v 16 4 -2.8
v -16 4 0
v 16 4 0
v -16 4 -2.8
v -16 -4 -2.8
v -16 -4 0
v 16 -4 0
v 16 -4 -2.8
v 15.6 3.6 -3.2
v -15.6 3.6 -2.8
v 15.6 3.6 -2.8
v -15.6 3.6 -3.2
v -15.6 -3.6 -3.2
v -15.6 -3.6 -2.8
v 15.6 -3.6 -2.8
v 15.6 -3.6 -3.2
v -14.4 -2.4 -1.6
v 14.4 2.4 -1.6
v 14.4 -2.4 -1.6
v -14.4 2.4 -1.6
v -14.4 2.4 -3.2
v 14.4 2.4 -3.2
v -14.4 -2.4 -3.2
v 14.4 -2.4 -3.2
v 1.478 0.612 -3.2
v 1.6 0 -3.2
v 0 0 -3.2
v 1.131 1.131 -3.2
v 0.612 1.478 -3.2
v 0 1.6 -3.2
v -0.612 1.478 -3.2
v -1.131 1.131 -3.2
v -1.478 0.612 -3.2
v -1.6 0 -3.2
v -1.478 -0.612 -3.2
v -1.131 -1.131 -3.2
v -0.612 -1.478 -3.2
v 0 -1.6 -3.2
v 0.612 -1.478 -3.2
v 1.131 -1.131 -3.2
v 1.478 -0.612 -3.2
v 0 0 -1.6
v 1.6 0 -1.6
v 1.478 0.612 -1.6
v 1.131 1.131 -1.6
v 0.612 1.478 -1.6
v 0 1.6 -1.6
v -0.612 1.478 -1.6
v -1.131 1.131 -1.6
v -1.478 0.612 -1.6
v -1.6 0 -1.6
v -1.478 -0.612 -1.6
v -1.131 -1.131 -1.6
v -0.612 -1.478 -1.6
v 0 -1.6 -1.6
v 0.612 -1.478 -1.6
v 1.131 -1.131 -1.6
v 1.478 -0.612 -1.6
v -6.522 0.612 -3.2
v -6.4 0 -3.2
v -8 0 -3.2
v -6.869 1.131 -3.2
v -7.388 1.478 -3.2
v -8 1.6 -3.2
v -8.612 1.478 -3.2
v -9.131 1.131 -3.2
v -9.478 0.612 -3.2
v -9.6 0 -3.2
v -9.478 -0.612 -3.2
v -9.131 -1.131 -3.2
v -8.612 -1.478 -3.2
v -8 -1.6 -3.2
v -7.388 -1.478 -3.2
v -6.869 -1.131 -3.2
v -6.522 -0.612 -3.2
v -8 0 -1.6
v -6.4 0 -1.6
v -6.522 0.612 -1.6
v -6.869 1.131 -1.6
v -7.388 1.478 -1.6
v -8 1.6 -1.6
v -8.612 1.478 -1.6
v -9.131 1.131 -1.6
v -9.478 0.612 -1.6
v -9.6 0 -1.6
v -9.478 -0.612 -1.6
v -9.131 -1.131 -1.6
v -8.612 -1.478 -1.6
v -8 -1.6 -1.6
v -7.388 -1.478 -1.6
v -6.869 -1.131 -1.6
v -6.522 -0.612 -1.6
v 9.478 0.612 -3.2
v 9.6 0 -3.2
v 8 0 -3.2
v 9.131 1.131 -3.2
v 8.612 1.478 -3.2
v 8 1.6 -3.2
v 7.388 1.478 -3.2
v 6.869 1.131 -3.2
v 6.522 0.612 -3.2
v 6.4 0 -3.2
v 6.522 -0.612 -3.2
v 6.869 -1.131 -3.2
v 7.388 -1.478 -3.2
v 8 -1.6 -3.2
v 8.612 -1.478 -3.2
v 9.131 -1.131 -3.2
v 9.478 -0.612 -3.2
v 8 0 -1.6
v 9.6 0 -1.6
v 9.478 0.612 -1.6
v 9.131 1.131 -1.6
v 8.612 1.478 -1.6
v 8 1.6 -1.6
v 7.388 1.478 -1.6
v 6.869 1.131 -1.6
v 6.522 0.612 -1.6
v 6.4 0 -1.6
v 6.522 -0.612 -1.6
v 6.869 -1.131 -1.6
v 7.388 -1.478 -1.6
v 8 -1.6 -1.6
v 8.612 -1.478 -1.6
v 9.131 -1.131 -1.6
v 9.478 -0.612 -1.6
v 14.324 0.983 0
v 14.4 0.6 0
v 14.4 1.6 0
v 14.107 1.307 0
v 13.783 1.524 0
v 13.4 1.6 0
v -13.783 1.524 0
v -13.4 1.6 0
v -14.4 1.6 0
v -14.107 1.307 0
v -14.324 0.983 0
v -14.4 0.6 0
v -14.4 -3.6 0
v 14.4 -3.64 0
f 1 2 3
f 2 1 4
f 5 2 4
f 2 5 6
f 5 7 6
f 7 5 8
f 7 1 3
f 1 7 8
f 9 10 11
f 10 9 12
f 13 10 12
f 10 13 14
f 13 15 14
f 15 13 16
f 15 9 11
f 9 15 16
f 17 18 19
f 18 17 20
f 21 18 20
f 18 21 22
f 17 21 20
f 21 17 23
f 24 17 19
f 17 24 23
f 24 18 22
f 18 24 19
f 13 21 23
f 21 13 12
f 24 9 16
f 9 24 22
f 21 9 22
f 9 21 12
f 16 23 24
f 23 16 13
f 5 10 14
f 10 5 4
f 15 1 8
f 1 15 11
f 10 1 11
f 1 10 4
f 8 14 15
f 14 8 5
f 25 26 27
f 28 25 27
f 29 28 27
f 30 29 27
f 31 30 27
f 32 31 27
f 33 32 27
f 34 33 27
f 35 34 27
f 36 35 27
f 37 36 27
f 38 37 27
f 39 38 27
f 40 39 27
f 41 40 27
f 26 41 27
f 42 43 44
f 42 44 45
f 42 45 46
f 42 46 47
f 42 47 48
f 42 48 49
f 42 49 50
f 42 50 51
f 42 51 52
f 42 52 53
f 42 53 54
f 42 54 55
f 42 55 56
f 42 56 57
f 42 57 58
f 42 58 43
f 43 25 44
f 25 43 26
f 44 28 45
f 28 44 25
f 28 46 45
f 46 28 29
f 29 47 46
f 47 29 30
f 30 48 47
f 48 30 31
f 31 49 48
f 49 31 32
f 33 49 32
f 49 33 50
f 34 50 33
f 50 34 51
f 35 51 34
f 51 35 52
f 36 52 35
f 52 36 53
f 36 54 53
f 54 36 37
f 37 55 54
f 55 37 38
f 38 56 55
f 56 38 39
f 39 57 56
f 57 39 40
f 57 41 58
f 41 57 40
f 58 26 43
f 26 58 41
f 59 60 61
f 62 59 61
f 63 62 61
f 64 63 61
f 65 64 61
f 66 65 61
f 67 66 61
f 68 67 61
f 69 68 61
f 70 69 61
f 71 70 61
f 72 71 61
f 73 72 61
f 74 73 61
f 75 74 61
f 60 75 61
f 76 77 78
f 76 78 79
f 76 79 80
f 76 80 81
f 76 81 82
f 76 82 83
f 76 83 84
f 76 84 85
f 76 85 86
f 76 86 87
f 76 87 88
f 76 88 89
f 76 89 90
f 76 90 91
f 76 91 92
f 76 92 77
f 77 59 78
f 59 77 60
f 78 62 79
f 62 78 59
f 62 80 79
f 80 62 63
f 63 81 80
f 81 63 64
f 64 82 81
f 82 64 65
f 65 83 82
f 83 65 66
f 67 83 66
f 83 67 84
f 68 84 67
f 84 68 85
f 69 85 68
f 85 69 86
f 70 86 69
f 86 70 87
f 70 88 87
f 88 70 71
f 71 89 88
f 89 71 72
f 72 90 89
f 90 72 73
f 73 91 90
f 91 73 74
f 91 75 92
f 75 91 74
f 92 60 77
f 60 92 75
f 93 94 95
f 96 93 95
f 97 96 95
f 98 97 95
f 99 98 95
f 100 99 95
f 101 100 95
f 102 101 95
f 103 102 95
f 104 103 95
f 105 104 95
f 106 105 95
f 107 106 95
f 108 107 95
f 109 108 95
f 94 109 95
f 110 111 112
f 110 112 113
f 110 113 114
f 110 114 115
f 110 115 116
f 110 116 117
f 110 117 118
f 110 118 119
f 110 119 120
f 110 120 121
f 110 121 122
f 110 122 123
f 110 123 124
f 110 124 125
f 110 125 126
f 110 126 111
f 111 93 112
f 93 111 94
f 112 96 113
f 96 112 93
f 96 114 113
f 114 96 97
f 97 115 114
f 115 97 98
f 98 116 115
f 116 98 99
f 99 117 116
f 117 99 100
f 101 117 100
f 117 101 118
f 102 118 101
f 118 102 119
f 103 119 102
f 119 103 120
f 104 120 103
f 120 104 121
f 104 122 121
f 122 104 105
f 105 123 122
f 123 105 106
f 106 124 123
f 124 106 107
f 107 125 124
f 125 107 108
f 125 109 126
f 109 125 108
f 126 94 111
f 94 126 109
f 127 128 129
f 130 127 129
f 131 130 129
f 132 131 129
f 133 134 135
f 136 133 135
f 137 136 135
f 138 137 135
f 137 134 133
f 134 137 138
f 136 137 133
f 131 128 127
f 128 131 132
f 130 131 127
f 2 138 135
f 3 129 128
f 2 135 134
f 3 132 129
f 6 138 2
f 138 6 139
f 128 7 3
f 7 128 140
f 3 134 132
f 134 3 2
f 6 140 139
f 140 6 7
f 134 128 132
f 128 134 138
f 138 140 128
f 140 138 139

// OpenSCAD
// file: ../p/4-4edge.scad
use <../lib.scad>
function ldraw_lib__4_4edge() = [
// 0 Circle 1.0
// 0 Name: 4-4edge.dat
// 0 Author: James Jessiman
// 0 !LDRAW_ORG Primitive UPDATE 2017-01
// 0 !LICENSE Licensed under CC BY 2.0 and CC BY 4.0 : see CAreadme.txt
// 
// 0 BFC CERTIFY CCW
  [0,"BFC","CERTIFY"],
  [0,"BFC","CCW"],
// 
// 0 !HISTORY 1998-12-15 [PTadmin] Official Update 1998-10
// 0 !HISTORY 2005-12-28 [PTadmin] Official Update 2005-01
// 0 !HISTORY 2007-06-24 [PTadmin] Header formatted for Contributor Agreement
// 0 !HISTORY 2008-07-01 [PTadmin] Official Update 2008-01
// 0 !HISTORY 2017-01-15 [Steffen] BFCed
// 0 !HISTORY 2017-12-30 [PTadmin] Official Update 2017-01
// 
// 
// 2 24 1 0 0 0.9239 0 0.3827
  [2,24,1,0,0,0.9239,0,0.3827],
// 2 24 0.9239 0 0.3827 0.7071 0 0.7071
  [2,24,0.9239,0,0.3827,0.7071,0,0.7071],
// 2 24 0.7071 0 0.7071 0.3827 0 0.9239
  [2,24,0.7071,0,0.7071,0.3827,0,0.9239],
// 2 24 0.3827 0 0.9239 0 0 1
  [2,24,0.3827,0,0.9239,0,0,1],
// 2 24 0 0 1 -0.3827 0 0.9239
  [2,24,0,0,1,-0.3827,0,0.9239],
// 2 24 -0.3827 0 0.9239 -0.7071 0 0.7071
  [2,24,-0.3827,0,0.9239,-0.7071,0,0.7071],
// 2 24 -0.7071 0 0.7071 -0.9239 0 0.3827
  [2,24,-0.7071,0,0.7071,-0.9239,0,0.3827],
// 2 24 -0.9239 0 0.3827 -1 0 -0
  [2,24,-0.9239,0,0.3827,-1,0,-0],
// 2 24 -1 0 -0 -0.9239 0 -0.3827
  [2,24,-1,0,-0,-0.9239,0,-0.3827],
// 2 24 -0.9239 0 -0.3827 -0.7071 0 -0.7071
  [2,24,-0.9239,0,-0.3827,-0.7071,0,-0.7071],
// 2 24 -0.7071 0 -0.7071 -0.3827 0 -0.9239
  [2,24,-0.7071,0,-0.7071,-0.3827,0,-0.9239],
// 2 24 -0.3827 0 -0.9239 0 0 -1
  [2,24,-0.3827,0,-0.9239,0,0,-1],
// 2 24 0 0 -1 0.3827 0 -0.9239
  [2,24,0,0,-1,0.3827,0,-0.9239],
// 2 24 0.3827 0 -0.9239 0.7071 0 -0.7071
  [2,24,0.3827,0,-0.9239,0.7071,0,-0.7071],
// 2 24 0.7071 0 -0.7071 0.9239 0 -0.3827
  [2,24,0.7071,0,-0.7071,0.9239,0,-0.3827],
// 2 24 0.9239 0 -0.3827 1 0 0
  [2,24,0.9239,0,-0.3827,1,0,0],
];
module ldraw_lib__4_4edge(step=0, col=false, unit=2/5, alt=false, line=0.2, solid=!$preview)
    makepoly(ldraw_lib__4_4edge(), step=step, col=col, unit=unit, alt=alt, line=line, solid=solid);
ldraw_lib__4_4edge(line=0.2);
// file: ../p/4-4disc.scad
use <../lib.scad>
function ldraw_lib__4_4disc() = [
// 0 Disc 1.0
// 0 Name: 4-4disc.dat
// 0 Author: James Jessiman
// 0 !LDRAW_ORG Primitive UPDATE 2002-02
// 0 !LICENSE Licensed under CC BY 2.0 and CC BY 4.0 : see CAreadme.txt
// 
// 0 BFC CERTIFY CCW
  [0,"BFC","CERTIFY"],
  [0,"BFC","CCW"],
// 
// 0 !HISTORY 1998-12-15 [PTadmin] Official Update 1998-10
// 0 !HISTORY 2002-03-23 [sbliss] Added BFC statement
// 0 !HISTORY 2002-04-25 [PTadmin] Official Update 2002-02
// 0 !HISTORY 2007-06-24 [PTadmin] Header formatted for Contributor Agreement
// 0 !HISTORY 2008-07-01 [PTadmin] Official Update 2008-01
// 
// 
// 3 16 0 0 0 1 0 0 0.9239 0 0.3827
  [3,16,0,0,0,1,0,0,0.9239,0,0.3827],
// 3 16 0 0 0 0.9239 0 0.3827 0.7071 0 0.7071
  [3,16,0,0,0,0.9239,0,0.3827,0.7071,0,0.7071],
// 3 16 0 0 0 0.7071 0 0.7071 0.3827 0 0.9239
  [3,16,0,0,0,0.7071,0,0.7071,0.3827,0,0.9239],
// 3 16 0 0 0 0.3827 0 0.9239 0 0 1
  [3,16,0,0,0,0.3827,0,0.9239,0,0,1],
// 3 16 0 0 0 0 0 1 -0.3827 0 0.9239
  [3,16,0,0,0,0,0,1,-0.3827,0,0.9239],
// 3 16 0 0 0 -0.3827 0 0.9239 -0.7071 0 0.7071
  [3,16,0,0,0,-0.3827,0,0.9239,-0.7071,0,0.7071],
// 3 16 0 0 0 -0.7071 0 0.7071 -0.9239 0 0.3827
  [3,16,0,0,0,-0.7071,0,0.7071,-0.9239,0,0.3827],
// 3 16 0 0 0 -0.9239 0 0.3827 -1 0 -0
  [3,16,0,0,0,-0.9239,0,0.3827,-1,0,-0],
// 3 16 0 0 0 -1 0 -0 -0.9239 0 -0.3827
  [3,16,0,0,0,-1,0,-0,-0.9239,0,-0.3827],
// 3 16 0 0 0 -0.9239 0 -0.3827 -0.7071 0 -0.7071
  [3,16,0,0,0,-0.9239,0,-0.3827,-0.7071,0,-0.7071],
// 3 16 0 0 0 -0.7071 0 -0.7071 -0.3827 0 -0.9239
  [3,16,0,0,0,-0.7071,0,-0.7071,-0.3827,0,-0.9239],
// 3 16 0 0 0 -0.3827 0 -0.9239 0 0 -1
  [3,16,0,0,0,-0.3827,0,-0.9239,0,0,-1],
// 3 16 0 0 0 0 0 -1 0.3827 0 -0.9239
  [3,16,0,0,0,0,0,-1,0.3827,0,-0.9239],
// 3 16 0 0 0 0.3827 0 -0.9239 0.7071 0 -0.7071
  [3,16,0,0,0,0.3827,0,-0.9239,0.7071,0,-0.7071],
// 3 16 0 0 0 0.7071 0 -0.7071 0.9239 0 -0.3827
  [3,16,0,0,0,0.7071,0,-0.7071,0.9239,0,-0.3827],
// 3 16 0 0 0 0.9239 0 -0.3827 1 0 0
  [3,16,0,0,0,0.9239,0,-0.3827,1,0,0],
// 0
];
module ldraw_lib__4_4disc(step=0, col=false, unit=2/5, alt=false, line=0.2, solid=!$preview)
    makepoly(ldraw_lib__4_4disc(), step=step, col=col, unit=unit, alt=alt, line=line, solid=solid);
ldraw_lib__4_4disc(line=0.2);
// file: ../p/4-4cyli.scad
use <../lib.scad>
$fa=1; $fs=0.2;
function ldraw_lib__4_4cyli(realsolid=false) = [
// 0 Cylinder 1.0
// 0 Name: 4-4cyli.dat
// 0 Author: James Jessiman
// 0 !LDRAW_ORG Primitive UPDATE 2005-01
// 0 !LICENSE Licensed under CC BY 2.0 and CC BY 4.0 : see CAreadme.txt
// 
// 0 BFC CERTIFY CCW
  [0,"BFC","CERTIFY"],
  [0,"BFC","CCW"],
// 
// 0 !HISTORY 1998-12-15 [PTadmin] Official Update 1998-10
// 0 !HISTORY 2002-03-23 [sbliss] Added BFC statement; merged headers from files in distributions LDraw 0.27 and Complete.
// 0 !HISTORY 2002-04-25 [PTadmin] Official Update 2002-02
// 0 !HISTORY 2004-12-14 [guyvivan] BFC CCW
// 0 !HISTORY 2005-12-28 [PTadmin] Official Update 2005-01
// 0 !HISTORY 2007-06-24 [PTadmin] Header formatted for Contributor Agreement
// 0 !HISTORY 2008-07-01 [PTadmin] Official Update 2008-01
// 
// 
// 4 16 1 1 0 0.9239 1 0.3827 0.9239 0 0.3827 1 0 0
  [4,16,1,1,0,0.9239,1,0.3827,0.9239,0,0.3827,1,0,0],
// 5 24 1 0 0 1 1 0 0.9239 0 0.3827 0.9239 0 -0.3827
  [5,24,1,0,0,1,1,0,0.9239,0,0.3827,0.9239,0,-0.3827],
// 4 16 0.9239 1 0.3827 0.7071 1 0.7071 0.7071 0 0.7071 0.9239 0 0.3827
  [4,16,0.9239,1,0.3827,0.7071,1,0.7071,0.7071,0,0.7071,0.9239,0,0.3827],
// 5 24 0.9239 0 0.3827 0.9239 1 0.3827 0.7071 0 0.7071 1 0 0
  [5,24,0.9239,0,0.3827,0.9239,1,0.3827,0.7071,0,0.7071,1,0,0],
// 4 16 0.7071 1 0.7071 0.3827 1 0.9239 0.3827 0 0.9239 0.7071 0 0.7071
  [4,16,0.7071,1,0.7071,0.3827,1,0.9239,0.3827,0,0.9239,0.7071,0,0.7071],
// 5 24 0.7071 0 0.7071 0.7071 1 0.7071 0.3827 0 0.9239 0.9239 0 0.3827
  [5,24,0.7071,0,0.7071,0.7071,1,0.7071,0.3827,0,0.9239,0.9239,0,0.3827],
// 4 16 0.3827 1 0.9239 0 1 1 0 0 1 0.3827 0 0.9239
  [4,16,0.3827,1,0.9239,0,1,1,0,0,1,0.3827,0,0.9239],
// 5 24 0.3827 0 0.9239 0.3827 1 0.9239 0 0 1 0.7071 0 0.7071
  [5,24,0.3827,0,0.9239,0.3827,1,0.9239,0,0,1,0.7071,0,0.7071],
// 4 16 0 1 1 -0.3827 1 0.9239 -0.3827 0 0.9239 0 0 1
  [4,16,0,1,1,-0.3827,1,0.9239,-0.3827,0,0.9239,0,0,1],
// 5 24 0 0 1 0 1 1 -0.3827 0 0.9239 0.3827 0 0.9239
  [5,24,0,0,1,0,1,1,-0.3827,0,0.9239,0.3827,0,0.9239],
// 4 16 -0.3827 1 0.9239 -0.7071 1 0.7071 -0.7071 0 0.7071 -0.3827 0 0.9239
  [4,16,-0.3827,1,0.9239,-0.7071,1,0.7071,-0.7071,0,0.7071,-0.3827,0,0.9239],
// 5 24 -0.3827 0 0.9239 -0.3827 1 0.9239 -0.7071 0 0.7071 0 0 1
  [5,24,-0.3827,0,0.9239,-0.3827,1,0.9239,-0.7071,0,0.7071,0,0,1],
// 4 16 -0.7071 1 0.7071 -0.9239 1 0.3827 -0.9239 0 0.3827 -0.7071 0 0.7071
  [4,16,-0.7071,1,0.7071,-0.9239,1,0.3827,-0.9239,0,0.3827,-0.7071,0,0.7071],
// 5 24 -0.7071 0 0.7071 -0.7071 1 0.7071 -0.9239 0 0.3827 -0.3827 0 0.9239
  [5,24,-0.7071,0,0.7071,-0.7071,1,0.7071,-0.9239,0,0.3827,-0.3827,0,0.9239],
// 4 16 -0.9239 1 0.3827 -1 1 0 -1 0 0 -0.9239 0 0.3827
  [4,16,-0.9239,1,0.3827,-1,1,0,-1,0,0,-0.9239,0,0.3827],
// 5 24 -0.9239 0 0.3827 -0.9239 1 0.3827 -1 0 0 -0.7071 0 0.7071
  [5,24,-0.9239,0,0.3827,-0.9239,1,0.3827,-1,0,0,-0.7071,0,0.7071],
// 4 16 -1 1 0 -0.9239 1 -0.3827 -0.9239 0 -0.3827 -1 0 0
  [4,16,-1,1,0,-0.9239,1,-0.3827,-0.9239,0,-0.3827,-1,0,0],
// 5 24 -1 0 0 -1 1 0 -0.9239 0 -0.3827 -0.9239 0 0.3827
  [5,24,-1,0,0,-1,1,0,-0.9239,0,-0.3827,-0.9239,0,0.3827],
// 4 16 -0.9239 1 -0.3827 -0.7071 1 -0.7071 -0.7071 0 -0.7071 -0.9239 0 -0.3827
  [4,16,-0.9239,1,-0.3827,-0.7071,1,-0.7071,-0.7071,0,-0.7071,-0.9239,0,-0.3827],
// 5 24 -0.9239 0 -0.3827 -0.9239 1 -0.3827 -0.7071 0 -0.7071 -1 0 0
  [5,24,-0.9239,0,-0.3827,-0.9239,1,-0.3827,-0.7071,0,-0.7071,-1,0,0],
// 4 16 -0.7071 1 -0.7071 -0.3827 1 -0.9239 -0.3827 0 -0.9239 -0.7071 0 -0.7071
  [4,16,-0.7071,1,-0.7071,-0.3827,1,-0.9239,-0.3827,0,-0.9239,-0.7071,0,-0.7071],
// 5 24 -0.7071 0 -0.7071 -0.7071 1 -0.7071 -0.3827 0 -0.9239 -0.9239 0 -0.3827
  [5,24,-0.7071,0,-0.7071,-0.7071,1,-0.7071,-0.3827,0,-0.9239,-0.9239,0,-0.3827],
// 4 16 -0.3827 1 -0.9239 0 1 -1 0 0 -1 -0.3827 0 -0.9239
  [4,16,-0.3827,1,-0.9239,0,1,-1,0,0,-1,-0.3827,0,-0.9239],
// 5 24 -0.3827 0 -0.9239 -0.3827 1 -0.9239 0 0 -1 -0.7071 0 -0.7071
  [5,24,-0.3827,0,-0.9239,-0.3827,1,-0.9239,0,0,-1,-0.7071,0,-0.7071],
// 4 16 0 1 -1 0.3827 1 -0.9239 0.3827 0 -0.9239 0 0 -1
  [4,16,0,1,-1,0.3827,1,-0.9239,0.3827,0,-0.9239,0,0,-1],
// 5 24 0 0 -1 0 1 -1 0.3827 0 -0.9239 -0.3827 0 -0.9239
  [5,24,0,0,-1,0,1,-1,0.3827,0,-0.9239,-0.3827,0,-0.9239],
// 4 16 0.3827 1 -0.9239 0.7071 1 -0.7071 0.7071 0 -0.7071 0.3827 0 -0.9239
  [4,16,0.3827,1,-0.9239,0.7071,1,-0.7071,0.7071,0,-0.7071,0.3827,0,-0.9239],
// 5 24 0.3827 0 -0.9239 0.3827 1 -0.9239 0.7071 0 -0.7071 0 0 -1
  [5,24,0.3827,0,-0.9239,0.3827,1,-0.9239,0.7071,0,-0.7071,0,0,-1],
// 4 16 0.7071 1 -0.7071 0.9239 1 -0.3827 0.9239 0 -0.3827 0.7071 0 -0.7071
  [4,16,0.7071,1,-0.7071,0.9239,1,-0.3827,0.9239,0,-0.3827,0.7071,0,-0.7071],
// 5 24 0.7071 0 -0.7071 0.7071 1 -0.7071 0.9239 0 -0.3827 0.3827 0 -0.9239
  [5,24,0.7071,0,-0.7071,0.7071,1,-0.7071,0.9239,0,-0.3827,0.3827,0,-0.9239],
// 4 16 0.9239 1 -0.3827 1 1 0 1 0 0 0.9239 0 -0.3827
  [4,16,0.9239,1,-0.3827,1,1,0,1,0,0,0.9239,0,-0.3827],
// 5 24 0.9239 0 -0.3827 0.9239 1 -0.3827 1 0 0 0.7071 0 -0.7071
  [5,24,0.9239,0,-0.3827,0.9239,1,-0.3827,1,0,0,0.7071,0,-0.7071],
// 0
];
module ldraw_lib__4_4cyli(step=0, col=false, unit=2/5, alt=false, line=0.2, solid=!$preview)
    makepoly(ldraw_lib__4_4cyli(solid), step=step, col=col, unit=unit, alt=alt, line=line, solid=solid);
ldraw_lib__4_4cyli(line=0.2);
// file: ../p/stud3.scad
use <../lib.scad>
use <4-4cyli.scad>
use <4-4disc.scad>
use <4-4edge.scad>
function ldraw_lib__stud3() = [
// 0 Stud Tube Solid
// 0 Name: stud3.dat
// 0 Author: James Jessiman
// 0 !LDRAW_ORG Primitive UPDATE 2012-01
// 0 !LICENSE Licensed under CC BY 4.0 : see CAreadme.txt
// 
// 0 BFC CERTIFY CCW
  [0,"BFC","CERTIFY"],
  [0,"BFC","CCW"],
// 
// 0 !HISTORY 2002-04-04 [sbliss] Modified for BFC compliance
// 0 !HISTORY 2002-04-25 [PTadmin] Official Update 2002-02
// 0 !HISTORY 2007-06-24 [PTadmin] Header formatted for Contributor Agreement
// 0 !HISTORY 2008-07-01 [PTadmin] Official Update 2008-01
// 0 !HISTORY 2012-02-16 [Philo] Changed to CCW
// 0 !HISTORY 2012-03-30 [PTadmin] Official Update 2012-01
// 
// 
// 1 16 0 -4 0 4 0 0 0 1 0 0 0 4 4-4edge.dat
  [1,16,0,-4,0,4,0,0,0,1,0,0,0,4, ldraw_lib__4_4edge()],
// 1 16 0 0 0 4 0 0 0 1 0 0 0 4 4-4edge.dat
  [1,16,0,0,0,4,0,0,0,1,0,0,0,4, ldraw_lib__4_4edge()],
// 1 16 0 -4 0 4 0 0 0 1 0 0 0 4 4-4disc.dat
  [1,16,0,-4,0,4,0,0,0,1,0,0,0,4, ldraw_lib__4_4disc()],
  [-1,16,0,0,0,4,0,0,0,-1,0,0,0,4, ldraw_lib__4_4disc()],
// 1 16 0 -4 0 4 0 0 0 4 0 0 0 4 4-4cyli.dat
  [1,16,0,-4,0,4,0,0,0,4,0,0,0,4, ldraw_lib__4_4cyli()],
];
module ldraw_lib__stud3(step=0, col=false, unit=2/5, alt=false, line=0.2, solid=!$preview)
    makepoly(ldraw_lib__stud3(), step=step, col=col, unit=unit, alt=alt, line=line, solid=solid);
ldraw_lib__stud3(line=0.2);
// file: ../p/box5.scad
use <../lib.scad>
function ldraw_lib__box5() = [
// 0 Box with 5 Faces and All Edges
// 0 Name: box5.dat
// 0 Author: James Jessiman
// 0 !LDRAW_ORG Primitive UPDATE 2012-01
// 0 !LICENSE Licensed under CC BY 2.0 and CC BY 4.0 : see CAreadme.txt
// 
// 0 BFC CERTIFY CCW
  [0,"BFC","CERTIFY"],
  [0,"BFC","CCW"],
// 
// 0 !HISTORY 2002-04-03 [sbliss] Modified for BFC compliance
// 0 !HISTORY 2002-04-25 [PTadmin] Official Update 2002-02
// 0 !HISTORY 2007-06-24 [PTadmin] Header formatted for Contributor Agreement
// 0 !HISTORY 2008-07-01 [PTadmin] Official Update 2008-01
// 0 !HISTORY 2012-02-16 [Philo] Changed to CCW
// 0 !HISTORY 2012-03-30 [PTadmin] Official Update 2012-01
// 
// 
// 2 24 1 1 1 -1 1 1
  [2,24,1,1,1,-1,1,1],
// 2 24 -1 1 1 -1 1 -1
  [2,24,-1,1,1,-1,1,-1],
// 2 24 -1 1 -1 1 1 -1
  [2,24,-1,1,-1,1,1,-1],
// 2 24 1 1 -1 1 1 1
  [2,24,1,1,-1,1,1,1],
// 2 24 1 0 1 -1 0 1
  [2,24,1,0,1,-1,0,1],
// 2 24 -1 0 1 -1 0 -1
  [2,24,-1,0,1,-1,0,-1],
// 2 24 -1 0 -1 1 0 -1
  [2,24,-1,0,-1,1,0,-1],
// 2 24 1 0 -1 1 0 1
  [2,24,1,0,-1,1,0,1],
// 2 24 1 0 1 1 1 1
  [2,24,1,0,1,1,1,1],
// 2 24 -1 0 1 -1 1 1
  [2,24,-1,0,1,-1,1,1],
// 2 24 1 0 -1 1 1 -1
  [2,24,1,0,-1,1,1,-1],
// 2 24 -1 0 -1 -1 1 -1
  [2,24,-1,0,-1,-1,1,-1],
// 4 16 -1 1 1 1 1 1 1 1 -1 -1 1 -1
  [4,16,-1,1,1,1,1,1,1,1,-1,-1,1,-1],
// 4 16 -1 1 1 -1 0 1 1 0 1 1 1 1
  [4,16,-1,1,1,-1,0,1,1,0,1,1,1,1],
// 4 16 -1 1 -1 -1 0 -1 -1 0 1 -1 1 1
  [4,16,-1,1,-1,-1,0,-1,-1,0,1,-1,1,1],
// 4 16 1 1 -1 1 0 -1 -1 0 -1 -1 1 -1
  [4,16,1,1,-1,1,0,-1,-1,0,-1,-1,1,-1],
// 4 16 1 1 1 1 0 1 1 0 -1 1 1 -1
  [4,16,1,1,1,1,0,1,1,0,-1,1,1,-1],
];
makepoly(ldraw_lib__box5(), line=0.2);
// file: ../p/box4.scad
use <../lib.scad>
function ldraw_lib__box4() = [
// 0 Box with 4 Faces (2 Parallel Pairs) and All Edges
// 0 Name: box4.dat
// 0 Author: James Jessiman
// 0 !LDRAW_ORG Primitive UPDATE 2012-01
// 0 !LICENSE Licensed under CC BY 4.0 : see CAreadme.txt
// 
// 0 BFC CERTIFY CCW
  [0,"BFC","CERTIFY"],
  [0,"BFC","CCW"],
// 
// 0 !HISTORY 2002-04-03 [sbliss] Modified for BFC compliance
// 0 !HISTORY 2002-04-25 [PTadmin] Official Update 2002-02
// 0 !HISTORY 2007-06-24 [PTadmin] Header formatted for Contributor Agreement
// 0 !HISTORY 2008-07-01 [PTadmin] Official Update 2008-01
// 0 !HISTORY 2012-02-16 [Philo] Changed to CCW
// 0 !HISTORY 2012-03-30 [PTadmin] Official Update 2012-01
// 
// 
// 2 24 1 1 1 -1 1 1
  [2,24,1,1,1,-1,1,1],
// 2 24 -1 1 1 -1 1 -1
  [2,24,-1,1,1,-1,1,-1],
// 2 24 -1 1 -1 1 1 -1
  [2,24,-1,1,-1,1,1,-1],
// 2 24 1 1 -1 1 1 1
  [2,24,1,1,-1,1,1,1],
// 2 24 1 0 1 -1 0 1
  [2,24,1,0,1,-1,0,1],
// 2 24 -1 0 1 -1 0 -1
  [2,24,-1,0,1,-1,0,-1],
// 2 24 -1 0 -1 1 0 -1
  [2,24,-1,0,-1,1,0,-1],
// 2 24 1 0 -1 1 0 1
  [2,24,1,0,-1,1,0,1],
// 2 24 1 0 1 1 1 1
  [2,24,1,0,1,1,1,1],
// 2 24 -1 0 1 -1 1 1
  [2,24,-1,0,1,-1,1,1],
// 2 24 1 0 -1 1 1 -1
  [2,24,1,0,-1,1,1,-1],
// 2 24 -1 0 -1 -1 1 -1
  [2,24,-1,0,-1,-1,1,-1],
// 4 16 -1 1 1 -1 0 1 1 0 1 1 1 1
  [4,16,-1,1,1,-1,0,1,1,0,1,1,1,1],
// 4 16 -1 1 -1 -1 0 -1 -1 0 1 -1 1 1
  [4,16,-1,1,-1,-1,0,-1,-1,0,1,-1,1,1],
// 4 16 1 1 -1 1 0 -1 -1 0 -1 -1 1 -1
  [4,16,1,1,-1,1,0,-1,-1,0,-1,-1,1,-1],
// 4 16 1 1 1 1 0 1 1 0 -1 1 1 -1
  [4,16,1,1,1,1,0,1,1,0,-1,1,1,-1],
];
module ldraw_lib__box4(step=0, col=false, unit=2/5, alt=false, line=0.2, solid=!$preview)
    makepoly(ldraw_lib__box4(), step=step, col=col, unit=unit, alt=alt, line=line, solid=solid);
ldraw_lib__box4(line=0.2);
// file: s/2431s01.scad
use <../../lib.scad>
use <../../p/box4.scad>
use <../../p/box5.scad>
use <../../p/stud3.scad>
function ldraw_lib__s__2431s01() = [
// 0 ~Tile  1 x  4 with Groove without Top Face
// 0 Name: s\2431s01.dat
// 0 Author: Santeri Piippo [arezey]
// 0 !LDRAW_ORG Subpart UPDATE 2010-02
// 0 !LICENSE Licensed under CC BY 2.0 and CC BY 4.0 : see CAreadme.txt
// 
// 0 BFC CERTIFY CCW
  [0,"BFC","CERTIFY"],
  [0,"BFC","CCW"],
// 
// 0 !HISTORY 2010-07-05 [PTadmin] Official Update 2010-02
// 
// 
// 1 16 0 0 0 40 0 0 0 7 0 0 0 10 box4.dat
  [1,16,0,0,0,40,0,0,0,7,0,0,0,10, ldraw_lib__box4()],
// 1 16 0 7 0 39 0 0 0 1 0 0 0 9 box4.dat
  [1,16,0,7,0,39,0,0,0,1,0,0,0,9, ldraw_lib__box4()],
// 0 BFC INVERTNEXT
  [0,"BFC","INVERTNEXT"],
// 1 16 0 8 0 36 0 0 0 -4 0 0 0 6 box5.dat
  [1,16,0,8,0,36,0,0,0,-4,0,0,0,6, ldraw_lib__box5()],
// 4 16 -39 8 9 -36 8 6 -36 8 -6 -39 8 -9
  [4,16,-39,8,9,-36,8,6,-36,8,-6,-39,8,-9],
// 4 16 39 8 -9 36 8 -6 36 8 6 39 8 9
  [4,16,39,8,-9,36,8,-6,36,8,6,39,8,9],
// 4 16 39 8 9 36 8 6 -36 8 6 -39 8 9
  [4,16,39,8,9,36,8,6,-36,8,6,-39,8,9],
// 4 16 -39 8 -9 -36 8 -6 36 8 -6 39 8 -9
  [4,16,-39,8,-9,-36,8,-6,36,8,-6,39,8,-9],
// 4 16 -40 7 10 -39 7 9 -39 7 -9 -40 7 -10
  [4,16,-40,7,10,-39,7,9,-39,7,-9,-40,7,-10],
// 4 16 40 7 -10 39 7 -9 39 7 9 40 7 10
  [4,16,40,7,-10,39,7,-9,39,7,9,40,7,10],
// 4 16 40 7 10 39 7 9 -39 7 9 -40 7 10
  [4,16,40,7,10,39,7,9,-39,7,9,-40,7,10],
// 4 16 -40 7 -10 -39 7 -9 39 7 -9 40 7 -10
  [4,16,-40,7,-10,-39,7,-9,39,7,-9,40,7,-10],
// 1 16 0 4 0 1 0 0 0 -1 0 0 0 1 stud3.dat
  [1,16,0,4,0,1,0,0,0,-1,0,0,0,1, ldraw_lib__stud3()],
// 1 16 -20 4 0 1 0 0 0 -1 0 0 0 1 stud3.dat
  [1,16,-20,4,0,1,0,0,0,-1,0,0,0,1, ldraw_lib__stud3()],
// 1 16 20 4 0 1 0 0 0 -1 0 0 0 1 stud3.dat
  [1,16,20,4,0,1,0,0,0,-1,0,0,0,1, ldraw_lib__stud3()],
// 0 //
];
makepoly(ldraw_lib__s__2431s01(), line=0.2);
// file: ../p/1-4ndis.scad
use <../lib.scad>
function ldraw_lib__1_4ndis() = [
// 0 Disc Negative 0.25
// 0 Name: 1-4ndis.dat
// 0 Author: James Jessiman
// 0 !LDRAW_ORG Primitive UPDATE 2012-01
// 0 !LICENSE Licensed under CC BY 2.0 and CC BY 4.0 : see CAreadme.txt
// 
// 0 BFC CERTIFY CCW
  [0,"BFC","CERTIFY"],
  [0,"BFC","CCW"],
// 
// 0 !HISTORY 2002-03-23 [sbliss] Added BFC Statement
// 0 !HISTORY 2002-04-25 [PTadmin] Official Update 2002-02
// 0 !HISTORY 2007-06-22 [PTadmin] Header formatted for Contributor Agreement
// 0 !HISTORY 2008-07-01 [PTadmin] Official Update 2008-01
// 0 !HISTORY 2012-02-16 [Philo] Changed to CCW
// 0 !HISTORY 2012-03-30 [PTadmin] Official Update 2012-01
// 
// 
// 3 16 0.9239 0 0.3827 1 0 0 1 0 1
  [3,16,0.9239,0,0.3827,1,0,0,1,0,1],
// 3 16 0.7071 0 0.7071 0.9239 0 0.3827 1 0 1
  [3,16,0.7071,0,0.7071,0.9239,0,0.3827,1,0,1],
// 3 16 0.3827 0 0.9239 0.7071 0 0.7071 1 0 1
  [3,16,0.3827,0,0.9239,0.7071,0,0.7071,1,0,1],
// 3 16 0 0 1 0.3827 0 0.9239 1 0 1
  [3,16,0,0,1,0.3827,0,0.9239,1,0,1],
];
module ldraw_lib__1_4ndis(step=0, col=false, unit=2/5, alt=false, line=0.2, solid=!$preview)
    makepoly(ldraw_lib__1_4ndis(), step=step, col=col, unit=unit, alt=alt, line=line, solid=solid);
ldraw_lib__1_4ndis(line=0.2);
// file: ../p/1-4chrd.scad
use <../lib.scad>
$fa=1; $fs=0.2;
function ldraw_lib__1_4chrd(realsolid=false) = [
// 0 Chord 0.25
// 0 Name: 1-4chrd.dat
// 0 Author: Tony Hafner [hafhead]
// 0 !LDRAW_ORG Primitive UPDATE 2012-02
// 0 !LICENSE Licensed under CC BY 2.0 and CC BY 4.0 : see CAreadme.txt
// 
// 0 BFC CERTIFY CCW
  [0,"BFC","CERTIFY"],
  [0,"BFC","CCW"],
// 
// 0 !HISTORY 2004-04-22 [PTadmin] Official Update 2004-02
// 0 !HISTORY 2007-10-09 [PTadmin] Header formatted for Contributor Agreement
// 0 !HISTORY 2008-07-01 [PTadmin] Official Update 2008-01
// 0 !HISTORY 2012-08-02 [MMR1988] Re-creation with PrimGen2 and Rectifier
// 0 !HISTORY 2012-08-09 [PTadmin] Official Update 2012-02
// 
// 
// 4 16 0.9239 0 0.3827 0.3827 0 0.9239 0 0 1 1 0 0
  [4,16,0.9239,0,0.3827,0.3827,0,0.9239,0,0,1,1,0,0],
// 3 16 0.7071 0 0.7071 0.3827 0 0.9239 0.9239 0 0.3827
  [3,16,0.7071,0,0.7071,0.3827,0,0.9239,0.9239,0,0.3827],
];
module ldraw_lib__1_4chrd(step=0, col=false, unit=2/5, alt=false, line=0.2, solid=!$preview)
    makepoly(ldraw_lib__1_4chrd(solid), step=step, col=col, unit=unit, alt=alt, line=line, solid=solid);
ldraw_lib__1_4chrd(line=0.2);
// main file
use <../lib.scad>
use <../p/1-4chrd.scad>
use <../p/1-4ndis.scad>
use <s/2431s01.scad>
function ldraw_lib__2431p0a() = [
// 0 Tile  1 x  4 with Dark Bluish Grey Stripe Pattern
// 0 Name: 2431p0a.dat
// 0 Author: Florent Faramond [Makou]
// 0 !LDRAW_ORG Part UPDATE 2024-08
// 0 !LICENSE Licensed under CC BY 4.0 : see CAreadme.txt
// 
// 0 BFC CERTIFY CCW
  [0,"BFC","CERTIFY"],
  [0,"BFC","CCW"],
// 
// 0 !KEYWORDS Bricklink 2431pb638, Brickowl 221202, Rebrickable 2431pr0153
// 0 !KEYWORDS Set 71374
// 
// 0 !HISTORY 2024-07-29 [OrionP] Official Update 2024-06
// 0 !HISTORY 2024-08-28 [Cheenzo] Corrected spelling of Grey
// 0 !HISTORY 2024-09-30 [OrionP] Official Update 2024-08
// 
// 1 16 0 0 0 1 0 0 0 1 0 0 0 1 s\2431s01.dat
  [1,16,0,0,0,1,0,0,0,1,0,0,0,1, ldraw_lib__s__2431s01()],
// 
// 1 16 33.5 0 1.5 2.5 0 0 0 1 0 0 0 2.5 1-4ndis.dat
  [1,16,33.5,0,1.5,2.5,0,0,0,1,0,0,0,2.5, ldraw_lib__1_4ndis()],
// 1 16 -33.5 0 1.5 0 0 -2.5 0 1 0 2.5 0 0 1-4ndis.dat
  [1,16,-33.5,0,1.5,0,0,-2.5,0,1,0,2.5,0,0, ldraw_lib__1_4ndis()],
// 1 72 -33.5 0 1.5 0 0 -2.5 0 1 0 2.5 0 0 1-4chrd.dat
  [1,72,-33.5,0,1.5,0,0,-2.5,0,1,0,2.5,0,0, ldraw_lib__1_4chrd()],
// 1 72 33.5 0 1.5 2.5 0 0 0 1 0 0 0 2.5 1-4chrd.dat
  [1,72,33.5,0,1.5,2.5,0,0,0,1,0,0,0,2.5, ldraw_lib__1_4chrd()],
// 3 16 -40 0 10 -36 0 1.5 -36 0 4
  [3,16,-40,0,10,-36,0,1.5,-36,0,4],
// 3 16 40 0 10 36 0 4 36 0 1.5
  [3,16,40,0,10,36,0,4,36,0,1.5],
// 3 16 -40 0 10 -36 0 4 -33.5 0 4
  [3,16,-40,0,10,-36,0,4,-33.5,0,4],
// 3 16 40 0 10 33.5 0 4 36 0 4
  [3,16,40,0,10,33.5,0,4,36,0,4],
// 4 16 -36 0 -9 -36 0 1.5 -40 0 10 -40 0 -10
  [4,16,-36,0,-9,-36,0,1.5,-40,0,10,-40,0,-10],
// 4 16 40 0 10 36 0 1.5 36 0 -9.1 40 0 -10
  [4,16,40,0,10,36,0,1.5,36,0,-9.1,40,0,-10],
// 4 16 -40 0 10 -33.5 0 4 33.5 0 4 40 0 10
  [4,16,-40,0,10,-33.5,0,4,33.5,0,4,40,0,10],
// 4 16 36 0 -9.1 -36 0 -9 -40 0 -10 40 0 -10
  [4,16,36,0,-9.1,-36,0,-9,-40,0,-10,40,0,-10],
// 4 72 -36 0 1.5 36 0 1.5 33.5 0 4 -33.5 0 4
  [4,72,-36,0,1.5,36,0,1.5,33.5,0,4,-33.5,0,4],
// 4 72 -36 0 1.5 -36 0 -9 36 0 -9.1 36 0 1.5
  [4,72,-36,0,1.5,-36,0,-9,36,0,-9.1,36,0,1.5],
];
module ldraw_lib__2431p0a(step=0, col=false, unit=2/5, alt=false, line=0.2, solid=!$preview)
    makepoly(ldraw_lib__2431p0a(), step=step, col=col, unit=unit, alt=alt, line=line, solid=solid);
ldraw_lib__2431p0a(line=0.2);
